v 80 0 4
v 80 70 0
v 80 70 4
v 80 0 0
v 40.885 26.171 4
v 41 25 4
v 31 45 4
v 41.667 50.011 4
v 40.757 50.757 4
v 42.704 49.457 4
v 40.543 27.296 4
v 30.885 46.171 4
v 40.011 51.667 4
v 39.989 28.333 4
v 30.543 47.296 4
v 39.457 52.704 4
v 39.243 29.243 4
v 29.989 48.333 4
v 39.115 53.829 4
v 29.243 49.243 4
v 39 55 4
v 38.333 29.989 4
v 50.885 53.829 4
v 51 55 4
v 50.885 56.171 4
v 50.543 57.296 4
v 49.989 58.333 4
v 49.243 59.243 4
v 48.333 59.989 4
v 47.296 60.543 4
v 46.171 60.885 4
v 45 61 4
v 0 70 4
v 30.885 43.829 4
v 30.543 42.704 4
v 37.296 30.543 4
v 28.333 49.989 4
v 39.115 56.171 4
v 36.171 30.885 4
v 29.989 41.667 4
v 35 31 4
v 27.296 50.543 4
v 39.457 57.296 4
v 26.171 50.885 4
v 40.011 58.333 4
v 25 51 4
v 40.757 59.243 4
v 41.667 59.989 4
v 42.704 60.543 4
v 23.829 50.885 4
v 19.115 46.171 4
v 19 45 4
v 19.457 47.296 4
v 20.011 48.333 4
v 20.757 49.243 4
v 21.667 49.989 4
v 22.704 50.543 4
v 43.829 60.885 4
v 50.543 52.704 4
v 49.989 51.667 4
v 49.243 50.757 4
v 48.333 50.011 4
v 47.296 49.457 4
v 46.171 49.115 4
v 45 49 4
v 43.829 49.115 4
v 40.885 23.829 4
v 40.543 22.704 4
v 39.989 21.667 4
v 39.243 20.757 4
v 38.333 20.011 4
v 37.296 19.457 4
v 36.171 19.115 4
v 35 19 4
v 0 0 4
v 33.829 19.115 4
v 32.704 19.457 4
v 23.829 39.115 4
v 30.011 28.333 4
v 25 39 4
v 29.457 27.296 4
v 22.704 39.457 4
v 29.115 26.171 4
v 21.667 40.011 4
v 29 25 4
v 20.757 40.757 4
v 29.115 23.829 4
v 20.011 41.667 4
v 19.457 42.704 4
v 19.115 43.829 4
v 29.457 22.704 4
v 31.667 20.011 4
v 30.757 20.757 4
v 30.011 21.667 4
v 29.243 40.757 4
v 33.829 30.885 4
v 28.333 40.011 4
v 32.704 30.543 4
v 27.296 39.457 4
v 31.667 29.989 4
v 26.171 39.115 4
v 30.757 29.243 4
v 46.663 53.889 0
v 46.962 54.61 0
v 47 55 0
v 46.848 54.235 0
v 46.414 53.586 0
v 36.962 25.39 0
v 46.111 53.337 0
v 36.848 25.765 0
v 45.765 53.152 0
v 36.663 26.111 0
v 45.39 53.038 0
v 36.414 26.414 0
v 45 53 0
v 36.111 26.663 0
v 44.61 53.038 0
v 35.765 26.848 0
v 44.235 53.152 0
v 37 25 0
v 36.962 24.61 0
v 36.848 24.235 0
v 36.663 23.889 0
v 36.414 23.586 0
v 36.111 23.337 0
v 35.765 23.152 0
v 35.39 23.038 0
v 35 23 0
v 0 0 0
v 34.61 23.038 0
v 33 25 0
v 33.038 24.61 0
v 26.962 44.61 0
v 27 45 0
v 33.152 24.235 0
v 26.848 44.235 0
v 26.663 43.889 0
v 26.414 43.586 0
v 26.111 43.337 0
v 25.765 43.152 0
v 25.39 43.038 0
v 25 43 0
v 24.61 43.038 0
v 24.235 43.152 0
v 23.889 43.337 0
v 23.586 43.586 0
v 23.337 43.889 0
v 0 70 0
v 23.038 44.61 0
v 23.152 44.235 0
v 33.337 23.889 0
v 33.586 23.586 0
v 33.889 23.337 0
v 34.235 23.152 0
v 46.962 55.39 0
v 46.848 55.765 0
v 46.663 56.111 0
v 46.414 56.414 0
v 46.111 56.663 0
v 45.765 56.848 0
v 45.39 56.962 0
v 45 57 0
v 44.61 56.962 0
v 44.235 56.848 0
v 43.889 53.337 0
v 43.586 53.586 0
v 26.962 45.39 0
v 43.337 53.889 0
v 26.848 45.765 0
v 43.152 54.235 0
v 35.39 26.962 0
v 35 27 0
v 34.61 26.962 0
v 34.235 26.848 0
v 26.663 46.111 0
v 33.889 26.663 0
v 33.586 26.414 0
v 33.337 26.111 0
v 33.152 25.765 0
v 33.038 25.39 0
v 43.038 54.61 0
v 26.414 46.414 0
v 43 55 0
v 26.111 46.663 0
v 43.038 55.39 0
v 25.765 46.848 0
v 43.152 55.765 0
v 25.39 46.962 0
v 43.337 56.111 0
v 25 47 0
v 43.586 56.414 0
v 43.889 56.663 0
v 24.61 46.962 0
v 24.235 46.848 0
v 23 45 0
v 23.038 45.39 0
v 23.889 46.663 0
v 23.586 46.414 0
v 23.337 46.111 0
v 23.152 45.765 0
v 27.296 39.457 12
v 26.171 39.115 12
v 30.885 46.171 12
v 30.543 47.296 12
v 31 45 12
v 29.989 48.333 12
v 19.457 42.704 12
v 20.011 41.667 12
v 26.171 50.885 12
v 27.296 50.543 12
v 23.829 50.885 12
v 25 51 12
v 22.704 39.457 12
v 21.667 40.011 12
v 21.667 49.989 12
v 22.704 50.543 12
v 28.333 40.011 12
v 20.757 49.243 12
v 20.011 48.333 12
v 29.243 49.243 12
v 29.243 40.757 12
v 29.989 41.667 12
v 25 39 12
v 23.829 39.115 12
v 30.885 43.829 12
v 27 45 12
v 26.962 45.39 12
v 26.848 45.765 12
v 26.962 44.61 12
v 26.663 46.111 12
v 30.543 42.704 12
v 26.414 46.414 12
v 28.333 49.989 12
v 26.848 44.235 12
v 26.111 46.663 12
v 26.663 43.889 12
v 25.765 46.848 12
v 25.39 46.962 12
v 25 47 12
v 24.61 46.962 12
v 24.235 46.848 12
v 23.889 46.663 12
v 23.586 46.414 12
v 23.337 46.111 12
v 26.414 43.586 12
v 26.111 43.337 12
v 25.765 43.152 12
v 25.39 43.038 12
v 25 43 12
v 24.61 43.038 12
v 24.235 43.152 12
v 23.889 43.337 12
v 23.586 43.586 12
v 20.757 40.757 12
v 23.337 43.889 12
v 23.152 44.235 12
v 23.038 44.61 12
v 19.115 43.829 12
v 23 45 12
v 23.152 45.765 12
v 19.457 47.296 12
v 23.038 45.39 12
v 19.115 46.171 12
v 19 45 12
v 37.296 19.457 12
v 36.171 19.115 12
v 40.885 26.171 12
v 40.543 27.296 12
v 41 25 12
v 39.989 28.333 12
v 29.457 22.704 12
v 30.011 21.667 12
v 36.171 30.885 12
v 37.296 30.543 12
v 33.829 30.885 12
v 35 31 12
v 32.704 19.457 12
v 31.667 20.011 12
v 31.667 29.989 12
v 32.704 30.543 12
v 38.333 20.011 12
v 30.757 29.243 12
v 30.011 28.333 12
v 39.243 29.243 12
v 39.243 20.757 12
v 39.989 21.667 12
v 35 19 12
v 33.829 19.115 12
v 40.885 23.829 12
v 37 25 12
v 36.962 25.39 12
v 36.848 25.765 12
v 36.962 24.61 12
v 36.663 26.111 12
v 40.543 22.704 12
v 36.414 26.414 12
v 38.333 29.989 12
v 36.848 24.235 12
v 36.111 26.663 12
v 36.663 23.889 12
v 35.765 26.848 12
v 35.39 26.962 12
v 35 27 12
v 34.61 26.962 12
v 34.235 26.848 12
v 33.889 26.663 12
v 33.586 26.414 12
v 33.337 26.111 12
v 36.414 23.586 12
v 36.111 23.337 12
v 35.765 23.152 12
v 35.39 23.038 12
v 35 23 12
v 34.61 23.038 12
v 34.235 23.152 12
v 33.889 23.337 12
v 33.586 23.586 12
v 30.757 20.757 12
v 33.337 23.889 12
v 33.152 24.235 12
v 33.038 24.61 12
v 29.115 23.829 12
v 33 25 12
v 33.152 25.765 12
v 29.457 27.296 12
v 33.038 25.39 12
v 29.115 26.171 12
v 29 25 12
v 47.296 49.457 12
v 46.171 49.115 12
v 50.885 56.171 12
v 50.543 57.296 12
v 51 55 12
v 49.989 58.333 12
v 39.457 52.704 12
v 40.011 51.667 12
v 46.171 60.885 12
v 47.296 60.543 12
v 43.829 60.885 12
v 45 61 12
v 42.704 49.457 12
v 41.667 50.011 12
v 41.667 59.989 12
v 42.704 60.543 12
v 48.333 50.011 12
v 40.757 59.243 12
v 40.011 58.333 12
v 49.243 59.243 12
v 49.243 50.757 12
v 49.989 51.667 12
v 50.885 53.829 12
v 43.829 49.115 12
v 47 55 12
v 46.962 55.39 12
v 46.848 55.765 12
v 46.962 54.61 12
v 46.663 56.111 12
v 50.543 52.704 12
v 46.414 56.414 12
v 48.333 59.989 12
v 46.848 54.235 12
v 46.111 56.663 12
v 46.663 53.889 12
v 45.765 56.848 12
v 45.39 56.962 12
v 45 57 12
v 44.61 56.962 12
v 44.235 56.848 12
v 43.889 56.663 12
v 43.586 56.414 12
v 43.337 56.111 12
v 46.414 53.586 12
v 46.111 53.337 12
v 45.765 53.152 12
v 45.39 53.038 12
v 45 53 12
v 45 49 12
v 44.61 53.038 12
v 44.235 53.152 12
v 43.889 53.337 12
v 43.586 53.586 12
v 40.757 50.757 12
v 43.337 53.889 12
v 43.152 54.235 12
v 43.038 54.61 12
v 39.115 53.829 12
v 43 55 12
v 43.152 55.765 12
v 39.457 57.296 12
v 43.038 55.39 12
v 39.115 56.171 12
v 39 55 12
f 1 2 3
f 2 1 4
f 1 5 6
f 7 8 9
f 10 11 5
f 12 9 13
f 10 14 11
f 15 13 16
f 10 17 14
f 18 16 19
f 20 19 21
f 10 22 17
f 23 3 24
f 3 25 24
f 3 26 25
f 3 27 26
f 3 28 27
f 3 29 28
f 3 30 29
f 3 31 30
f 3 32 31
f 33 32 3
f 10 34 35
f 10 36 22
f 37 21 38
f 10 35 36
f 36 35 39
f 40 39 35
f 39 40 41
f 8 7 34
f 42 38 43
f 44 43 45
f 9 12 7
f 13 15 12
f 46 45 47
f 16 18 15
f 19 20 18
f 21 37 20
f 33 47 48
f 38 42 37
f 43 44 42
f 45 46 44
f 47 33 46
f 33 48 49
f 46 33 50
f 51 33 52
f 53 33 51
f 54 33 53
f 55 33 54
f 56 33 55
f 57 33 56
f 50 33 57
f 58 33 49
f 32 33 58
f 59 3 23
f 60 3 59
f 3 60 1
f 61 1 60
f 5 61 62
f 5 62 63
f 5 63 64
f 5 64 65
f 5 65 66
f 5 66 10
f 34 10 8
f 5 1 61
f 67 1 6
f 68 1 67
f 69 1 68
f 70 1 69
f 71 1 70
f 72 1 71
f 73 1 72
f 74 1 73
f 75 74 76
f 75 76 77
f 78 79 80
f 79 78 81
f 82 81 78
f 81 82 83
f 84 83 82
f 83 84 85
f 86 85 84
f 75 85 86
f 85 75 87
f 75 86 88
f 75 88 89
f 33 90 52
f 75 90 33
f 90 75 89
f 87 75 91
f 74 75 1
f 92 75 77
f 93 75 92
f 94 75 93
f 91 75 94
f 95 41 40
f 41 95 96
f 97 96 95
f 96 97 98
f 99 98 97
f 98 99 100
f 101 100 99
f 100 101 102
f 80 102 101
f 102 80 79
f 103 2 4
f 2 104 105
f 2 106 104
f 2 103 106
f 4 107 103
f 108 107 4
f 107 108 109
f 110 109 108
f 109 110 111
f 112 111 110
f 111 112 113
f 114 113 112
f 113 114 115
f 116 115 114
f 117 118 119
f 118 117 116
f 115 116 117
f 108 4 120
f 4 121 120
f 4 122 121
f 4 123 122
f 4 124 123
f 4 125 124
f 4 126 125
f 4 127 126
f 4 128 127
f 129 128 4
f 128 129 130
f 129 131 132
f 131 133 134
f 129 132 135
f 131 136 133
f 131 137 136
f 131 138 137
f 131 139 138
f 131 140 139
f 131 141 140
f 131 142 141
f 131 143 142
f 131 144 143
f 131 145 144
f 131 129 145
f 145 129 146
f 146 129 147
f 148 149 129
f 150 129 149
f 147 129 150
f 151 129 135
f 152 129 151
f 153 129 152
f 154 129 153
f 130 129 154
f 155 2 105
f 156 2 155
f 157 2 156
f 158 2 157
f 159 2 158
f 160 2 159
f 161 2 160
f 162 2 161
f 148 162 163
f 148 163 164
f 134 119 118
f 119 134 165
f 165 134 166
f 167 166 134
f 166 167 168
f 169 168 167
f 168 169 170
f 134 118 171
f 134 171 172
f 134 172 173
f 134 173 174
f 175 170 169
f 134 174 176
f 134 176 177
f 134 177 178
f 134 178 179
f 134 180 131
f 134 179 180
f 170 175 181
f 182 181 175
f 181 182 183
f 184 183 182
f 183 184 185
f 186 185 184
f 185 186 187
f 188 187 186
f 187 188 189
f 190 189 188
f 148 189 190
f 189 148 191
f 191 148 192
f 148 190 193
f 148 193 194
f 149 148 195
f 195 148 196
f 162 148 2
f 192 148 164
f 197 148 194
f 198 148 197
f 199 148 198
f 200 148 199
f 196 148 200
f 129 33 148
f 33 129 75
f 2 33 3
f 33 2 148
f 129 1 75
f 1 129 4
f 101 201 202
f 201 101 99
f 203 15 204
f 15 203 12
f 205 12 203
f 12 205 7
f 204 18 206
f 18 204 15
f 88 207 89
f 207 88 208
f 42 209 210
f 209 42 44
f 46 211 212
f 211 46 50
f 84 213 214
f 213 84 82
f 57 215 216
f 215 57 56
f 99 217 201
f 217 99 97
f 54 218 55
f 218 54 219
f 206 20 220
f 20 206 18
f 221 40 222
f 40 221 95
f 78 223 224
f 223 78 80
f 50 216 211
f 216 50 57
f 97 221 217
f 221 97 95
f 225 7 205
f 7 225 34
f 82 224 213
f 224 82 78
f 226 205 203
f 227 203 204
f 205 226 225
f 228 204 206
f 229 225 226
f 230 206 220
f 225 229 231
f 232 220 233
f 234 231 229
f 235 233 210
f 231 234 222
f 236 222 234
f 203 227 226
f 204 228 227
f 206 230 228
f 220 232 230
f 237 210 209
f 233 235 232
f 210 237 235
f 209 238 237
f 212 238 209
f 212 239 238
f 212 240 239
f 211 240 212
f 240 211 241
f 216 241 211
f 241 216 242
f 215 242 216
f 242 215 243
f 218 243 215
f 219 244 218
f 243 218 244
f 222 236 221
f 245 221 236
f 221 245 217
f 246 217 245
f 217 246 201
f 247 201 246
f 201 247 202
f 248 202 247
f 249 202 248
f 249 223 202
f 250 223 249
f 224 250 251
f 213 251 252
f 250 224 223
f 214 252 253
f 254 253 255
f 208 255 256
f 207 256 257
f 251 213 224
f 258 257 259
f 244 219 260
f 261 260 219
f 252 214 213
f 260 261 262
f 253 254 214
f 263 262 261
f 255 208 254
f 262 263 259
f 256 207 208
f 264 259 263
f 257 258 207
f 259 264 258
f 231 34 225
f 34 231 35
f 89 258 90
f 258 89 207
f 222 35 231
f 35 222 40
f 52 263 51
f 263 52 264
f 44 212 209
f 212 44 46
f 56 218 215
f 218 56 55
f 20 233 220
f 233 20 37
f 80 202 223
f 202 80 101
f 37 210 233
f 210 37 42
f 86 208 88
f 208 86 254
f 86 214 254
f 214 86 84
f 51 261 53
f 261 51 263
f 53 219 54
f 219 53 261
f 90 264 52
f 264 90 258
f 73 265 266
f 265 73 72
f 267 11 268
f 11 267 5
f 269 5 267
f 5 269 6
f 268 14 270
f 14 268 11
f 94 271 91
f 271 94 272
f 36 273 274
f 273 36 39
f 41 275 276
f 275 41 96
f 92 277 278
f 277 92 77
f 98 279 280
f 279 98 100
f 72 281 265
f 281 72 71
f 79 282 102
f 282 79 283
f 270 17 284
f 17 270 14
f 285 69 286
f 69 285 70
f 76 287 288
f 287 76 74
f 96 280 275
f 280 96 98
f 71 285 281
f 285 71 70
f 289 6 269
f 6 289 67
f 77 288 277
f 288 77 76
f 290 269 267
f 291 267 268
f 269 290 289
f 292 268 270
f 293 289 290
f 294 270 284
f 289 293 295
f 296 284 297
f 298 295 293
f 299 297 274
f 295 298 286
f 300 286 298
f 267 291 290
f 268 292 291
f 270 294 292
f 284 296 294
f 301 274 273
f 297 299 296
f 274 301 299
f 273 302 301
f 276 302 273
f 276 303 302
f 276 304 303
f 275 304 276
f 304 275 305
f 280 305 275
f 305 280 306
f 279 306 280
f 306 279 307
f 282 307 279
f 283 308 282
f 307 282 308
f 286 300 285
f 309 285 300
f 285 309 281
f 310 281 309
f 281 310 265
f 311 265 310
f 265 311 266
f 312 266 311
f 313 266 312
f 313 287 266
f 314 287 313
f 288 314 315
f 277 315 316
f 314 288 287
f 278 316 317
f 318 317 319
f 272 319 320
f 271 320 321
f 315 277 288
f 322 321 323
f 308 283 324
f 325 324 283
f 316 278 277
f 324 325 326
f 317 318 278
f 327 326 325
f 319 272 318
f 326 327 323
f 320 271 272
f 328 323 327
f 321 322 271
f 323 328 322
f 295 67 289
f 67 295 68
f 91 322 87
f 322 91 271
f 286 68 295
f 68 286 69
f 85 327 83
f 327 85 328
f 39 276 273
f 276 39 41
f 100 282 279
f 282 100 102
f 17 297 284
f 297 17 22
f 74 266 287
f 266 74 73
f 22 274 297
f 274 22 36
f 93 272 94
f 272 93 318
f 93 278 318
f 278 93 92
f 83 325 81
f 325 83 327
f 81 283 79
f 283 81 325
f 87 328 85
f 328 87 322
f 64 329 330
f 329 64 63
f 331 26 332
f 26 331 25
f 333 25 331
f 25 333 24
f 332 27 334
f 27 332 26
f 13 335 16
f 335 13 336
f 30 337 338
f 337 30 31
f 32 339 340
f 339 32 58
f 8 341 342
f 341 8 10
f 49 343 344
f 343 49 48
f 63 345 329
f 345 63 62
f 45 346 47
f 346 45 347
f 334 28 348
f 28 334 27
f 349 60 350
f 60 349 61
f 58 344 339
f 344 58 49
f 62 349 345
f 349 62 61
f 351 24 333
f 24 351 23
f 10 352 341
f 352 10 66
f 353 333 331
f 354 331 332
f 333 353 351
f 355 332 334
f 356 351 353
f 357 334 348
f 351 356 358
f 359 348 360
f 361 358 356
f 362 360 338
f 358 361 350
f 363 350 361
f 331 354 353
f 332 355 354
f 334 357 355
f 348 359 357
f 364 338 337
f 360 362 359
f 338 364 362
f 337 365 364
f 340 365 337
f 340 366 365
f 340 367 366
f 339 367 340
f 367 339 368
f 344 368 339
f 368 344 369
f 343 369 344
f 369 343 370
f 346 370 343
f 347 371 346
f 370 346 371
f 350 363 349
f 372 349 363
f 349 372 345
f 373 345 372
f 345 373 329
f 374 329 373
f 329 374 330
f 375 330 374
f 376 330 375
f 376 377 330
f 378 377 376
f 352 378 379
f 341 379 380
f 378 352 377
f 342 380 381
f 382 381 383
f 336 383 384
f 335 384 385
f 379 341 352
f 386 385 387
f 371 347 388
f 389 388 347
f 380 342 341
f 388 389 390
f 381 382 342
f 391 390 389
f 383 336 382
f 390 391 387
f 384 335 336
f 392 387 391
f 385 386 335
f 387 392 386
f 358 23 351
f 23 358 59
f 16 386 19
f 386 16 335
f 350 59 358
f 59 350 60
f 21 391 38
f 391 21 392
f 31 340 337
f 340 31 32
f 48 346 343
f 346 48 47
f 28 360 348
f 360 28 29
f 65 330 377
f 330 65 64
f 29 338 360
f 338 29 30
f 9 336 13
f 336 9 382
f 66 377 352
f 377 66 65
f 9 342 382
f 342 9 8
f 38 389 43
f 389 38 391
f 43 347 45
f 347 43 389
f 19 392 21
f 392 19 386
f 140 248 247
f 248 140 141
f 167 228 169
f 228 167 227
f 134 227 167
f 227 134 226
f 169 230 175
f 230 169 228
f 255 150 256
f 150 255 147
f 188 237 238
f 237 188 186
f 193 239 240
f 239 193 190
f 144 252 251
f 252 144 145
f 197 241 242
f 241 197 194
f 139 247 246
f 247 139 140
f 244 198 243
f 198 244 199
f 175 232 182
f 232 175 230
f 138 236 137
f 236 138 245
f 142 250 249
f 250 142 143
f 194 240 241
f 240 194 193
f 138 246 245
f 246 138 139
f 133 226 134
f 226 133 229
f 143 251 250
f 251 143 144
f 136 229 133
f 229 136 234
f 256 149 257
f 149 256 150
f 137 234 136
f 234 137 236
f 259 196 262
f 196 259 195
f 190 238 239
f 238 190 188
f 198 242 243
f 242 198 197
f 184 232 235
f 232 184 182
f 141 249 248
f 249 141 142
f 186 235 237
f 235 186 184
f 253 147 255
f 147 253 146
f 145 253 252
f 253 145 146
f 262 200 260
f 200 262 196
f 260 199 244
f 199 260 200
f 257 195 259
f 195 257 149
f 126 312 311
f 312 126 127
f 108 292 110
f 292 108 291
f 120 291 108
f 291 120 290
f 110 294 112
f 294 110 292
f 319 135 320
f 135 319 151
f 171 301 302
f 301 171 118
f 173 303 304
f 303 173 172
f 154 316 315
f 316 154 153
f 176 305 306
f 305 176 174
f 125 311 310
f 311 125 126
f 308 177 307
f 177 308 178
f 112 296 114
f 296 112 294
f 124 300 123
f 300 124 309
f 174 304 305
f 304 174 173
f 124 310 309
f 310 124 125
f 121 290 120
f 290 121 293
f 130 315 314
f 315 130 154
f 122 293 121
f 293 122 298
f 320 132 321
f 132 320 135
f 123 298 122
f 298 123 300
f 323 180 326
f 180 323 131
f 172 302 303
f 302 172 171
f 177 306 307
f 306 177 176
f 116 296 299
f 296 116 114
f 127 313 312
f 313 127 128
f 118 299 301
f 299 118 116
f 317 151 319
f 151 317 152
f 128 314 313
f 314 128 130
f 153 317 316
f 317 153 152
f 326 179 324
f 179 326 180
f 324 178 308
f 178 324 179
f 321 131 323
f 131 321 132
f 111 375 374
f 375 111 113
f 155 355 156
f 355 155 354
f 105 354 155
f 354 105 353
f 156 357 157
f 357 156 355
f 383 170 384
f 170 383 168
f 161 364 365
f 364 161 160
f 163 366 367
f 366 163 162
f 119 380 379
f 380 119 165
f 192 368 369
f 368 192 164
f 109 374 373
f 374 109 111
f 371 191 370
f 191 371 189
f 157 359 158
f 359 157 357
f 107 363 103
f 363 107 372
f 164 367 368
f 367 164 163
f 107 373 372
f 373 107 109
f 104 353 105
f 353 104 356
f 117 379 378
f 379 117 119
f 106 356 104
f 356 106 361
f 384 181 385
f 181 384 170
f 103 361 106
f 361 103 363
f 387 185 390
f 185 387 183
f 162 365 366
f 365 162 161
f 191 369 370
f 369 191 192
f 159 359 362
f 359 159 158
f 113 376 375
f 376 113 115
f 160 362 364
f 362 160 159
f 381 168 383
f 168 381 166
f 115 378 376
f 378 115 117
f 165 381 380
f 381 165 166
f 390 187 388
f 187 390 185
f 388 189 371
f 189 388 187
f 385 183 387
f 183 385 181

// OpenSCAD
$fn = 32;

// ----------------------------------------------------------------------
// Boss field: plate with bosses at given coordinates
// ----------------------------------------------------------------------

// --- parameters (mm) ---
plate_l = 80;             // plate length, X
plate_w = 70;             // plate width, Y
plate_t = 4;              // plate thickness, Z
boss_d = 12;              // boss diameter
boss_h = 8;               // boss height above the plate
bore_d = 4;               // boss bore

total_h = plate_t + boss_h;  // overall height

difference() {
  union() {
    cube([plate_l, plate_w, plate_t]);
    translate([25, 45, plate_t]) cylinder(h = boss_h, d = boss_d);
    translate([35, 25, plate_t]) cylinder(h = boss_h, d = boss_d);
    translate([45, 55, plate_t]) cylinder(h = boss_h, d = boss_d);
  }
  translate([25, 45, -1]) cylinder(h = total_h + 2, d = bore_d);
  translate([35, 25, -1]) cylinder(h = total_h + 2, d = bore_d);
  translate([45, 55, -1]) cylinder(h = total_h + 2, d = bore_d);
}
